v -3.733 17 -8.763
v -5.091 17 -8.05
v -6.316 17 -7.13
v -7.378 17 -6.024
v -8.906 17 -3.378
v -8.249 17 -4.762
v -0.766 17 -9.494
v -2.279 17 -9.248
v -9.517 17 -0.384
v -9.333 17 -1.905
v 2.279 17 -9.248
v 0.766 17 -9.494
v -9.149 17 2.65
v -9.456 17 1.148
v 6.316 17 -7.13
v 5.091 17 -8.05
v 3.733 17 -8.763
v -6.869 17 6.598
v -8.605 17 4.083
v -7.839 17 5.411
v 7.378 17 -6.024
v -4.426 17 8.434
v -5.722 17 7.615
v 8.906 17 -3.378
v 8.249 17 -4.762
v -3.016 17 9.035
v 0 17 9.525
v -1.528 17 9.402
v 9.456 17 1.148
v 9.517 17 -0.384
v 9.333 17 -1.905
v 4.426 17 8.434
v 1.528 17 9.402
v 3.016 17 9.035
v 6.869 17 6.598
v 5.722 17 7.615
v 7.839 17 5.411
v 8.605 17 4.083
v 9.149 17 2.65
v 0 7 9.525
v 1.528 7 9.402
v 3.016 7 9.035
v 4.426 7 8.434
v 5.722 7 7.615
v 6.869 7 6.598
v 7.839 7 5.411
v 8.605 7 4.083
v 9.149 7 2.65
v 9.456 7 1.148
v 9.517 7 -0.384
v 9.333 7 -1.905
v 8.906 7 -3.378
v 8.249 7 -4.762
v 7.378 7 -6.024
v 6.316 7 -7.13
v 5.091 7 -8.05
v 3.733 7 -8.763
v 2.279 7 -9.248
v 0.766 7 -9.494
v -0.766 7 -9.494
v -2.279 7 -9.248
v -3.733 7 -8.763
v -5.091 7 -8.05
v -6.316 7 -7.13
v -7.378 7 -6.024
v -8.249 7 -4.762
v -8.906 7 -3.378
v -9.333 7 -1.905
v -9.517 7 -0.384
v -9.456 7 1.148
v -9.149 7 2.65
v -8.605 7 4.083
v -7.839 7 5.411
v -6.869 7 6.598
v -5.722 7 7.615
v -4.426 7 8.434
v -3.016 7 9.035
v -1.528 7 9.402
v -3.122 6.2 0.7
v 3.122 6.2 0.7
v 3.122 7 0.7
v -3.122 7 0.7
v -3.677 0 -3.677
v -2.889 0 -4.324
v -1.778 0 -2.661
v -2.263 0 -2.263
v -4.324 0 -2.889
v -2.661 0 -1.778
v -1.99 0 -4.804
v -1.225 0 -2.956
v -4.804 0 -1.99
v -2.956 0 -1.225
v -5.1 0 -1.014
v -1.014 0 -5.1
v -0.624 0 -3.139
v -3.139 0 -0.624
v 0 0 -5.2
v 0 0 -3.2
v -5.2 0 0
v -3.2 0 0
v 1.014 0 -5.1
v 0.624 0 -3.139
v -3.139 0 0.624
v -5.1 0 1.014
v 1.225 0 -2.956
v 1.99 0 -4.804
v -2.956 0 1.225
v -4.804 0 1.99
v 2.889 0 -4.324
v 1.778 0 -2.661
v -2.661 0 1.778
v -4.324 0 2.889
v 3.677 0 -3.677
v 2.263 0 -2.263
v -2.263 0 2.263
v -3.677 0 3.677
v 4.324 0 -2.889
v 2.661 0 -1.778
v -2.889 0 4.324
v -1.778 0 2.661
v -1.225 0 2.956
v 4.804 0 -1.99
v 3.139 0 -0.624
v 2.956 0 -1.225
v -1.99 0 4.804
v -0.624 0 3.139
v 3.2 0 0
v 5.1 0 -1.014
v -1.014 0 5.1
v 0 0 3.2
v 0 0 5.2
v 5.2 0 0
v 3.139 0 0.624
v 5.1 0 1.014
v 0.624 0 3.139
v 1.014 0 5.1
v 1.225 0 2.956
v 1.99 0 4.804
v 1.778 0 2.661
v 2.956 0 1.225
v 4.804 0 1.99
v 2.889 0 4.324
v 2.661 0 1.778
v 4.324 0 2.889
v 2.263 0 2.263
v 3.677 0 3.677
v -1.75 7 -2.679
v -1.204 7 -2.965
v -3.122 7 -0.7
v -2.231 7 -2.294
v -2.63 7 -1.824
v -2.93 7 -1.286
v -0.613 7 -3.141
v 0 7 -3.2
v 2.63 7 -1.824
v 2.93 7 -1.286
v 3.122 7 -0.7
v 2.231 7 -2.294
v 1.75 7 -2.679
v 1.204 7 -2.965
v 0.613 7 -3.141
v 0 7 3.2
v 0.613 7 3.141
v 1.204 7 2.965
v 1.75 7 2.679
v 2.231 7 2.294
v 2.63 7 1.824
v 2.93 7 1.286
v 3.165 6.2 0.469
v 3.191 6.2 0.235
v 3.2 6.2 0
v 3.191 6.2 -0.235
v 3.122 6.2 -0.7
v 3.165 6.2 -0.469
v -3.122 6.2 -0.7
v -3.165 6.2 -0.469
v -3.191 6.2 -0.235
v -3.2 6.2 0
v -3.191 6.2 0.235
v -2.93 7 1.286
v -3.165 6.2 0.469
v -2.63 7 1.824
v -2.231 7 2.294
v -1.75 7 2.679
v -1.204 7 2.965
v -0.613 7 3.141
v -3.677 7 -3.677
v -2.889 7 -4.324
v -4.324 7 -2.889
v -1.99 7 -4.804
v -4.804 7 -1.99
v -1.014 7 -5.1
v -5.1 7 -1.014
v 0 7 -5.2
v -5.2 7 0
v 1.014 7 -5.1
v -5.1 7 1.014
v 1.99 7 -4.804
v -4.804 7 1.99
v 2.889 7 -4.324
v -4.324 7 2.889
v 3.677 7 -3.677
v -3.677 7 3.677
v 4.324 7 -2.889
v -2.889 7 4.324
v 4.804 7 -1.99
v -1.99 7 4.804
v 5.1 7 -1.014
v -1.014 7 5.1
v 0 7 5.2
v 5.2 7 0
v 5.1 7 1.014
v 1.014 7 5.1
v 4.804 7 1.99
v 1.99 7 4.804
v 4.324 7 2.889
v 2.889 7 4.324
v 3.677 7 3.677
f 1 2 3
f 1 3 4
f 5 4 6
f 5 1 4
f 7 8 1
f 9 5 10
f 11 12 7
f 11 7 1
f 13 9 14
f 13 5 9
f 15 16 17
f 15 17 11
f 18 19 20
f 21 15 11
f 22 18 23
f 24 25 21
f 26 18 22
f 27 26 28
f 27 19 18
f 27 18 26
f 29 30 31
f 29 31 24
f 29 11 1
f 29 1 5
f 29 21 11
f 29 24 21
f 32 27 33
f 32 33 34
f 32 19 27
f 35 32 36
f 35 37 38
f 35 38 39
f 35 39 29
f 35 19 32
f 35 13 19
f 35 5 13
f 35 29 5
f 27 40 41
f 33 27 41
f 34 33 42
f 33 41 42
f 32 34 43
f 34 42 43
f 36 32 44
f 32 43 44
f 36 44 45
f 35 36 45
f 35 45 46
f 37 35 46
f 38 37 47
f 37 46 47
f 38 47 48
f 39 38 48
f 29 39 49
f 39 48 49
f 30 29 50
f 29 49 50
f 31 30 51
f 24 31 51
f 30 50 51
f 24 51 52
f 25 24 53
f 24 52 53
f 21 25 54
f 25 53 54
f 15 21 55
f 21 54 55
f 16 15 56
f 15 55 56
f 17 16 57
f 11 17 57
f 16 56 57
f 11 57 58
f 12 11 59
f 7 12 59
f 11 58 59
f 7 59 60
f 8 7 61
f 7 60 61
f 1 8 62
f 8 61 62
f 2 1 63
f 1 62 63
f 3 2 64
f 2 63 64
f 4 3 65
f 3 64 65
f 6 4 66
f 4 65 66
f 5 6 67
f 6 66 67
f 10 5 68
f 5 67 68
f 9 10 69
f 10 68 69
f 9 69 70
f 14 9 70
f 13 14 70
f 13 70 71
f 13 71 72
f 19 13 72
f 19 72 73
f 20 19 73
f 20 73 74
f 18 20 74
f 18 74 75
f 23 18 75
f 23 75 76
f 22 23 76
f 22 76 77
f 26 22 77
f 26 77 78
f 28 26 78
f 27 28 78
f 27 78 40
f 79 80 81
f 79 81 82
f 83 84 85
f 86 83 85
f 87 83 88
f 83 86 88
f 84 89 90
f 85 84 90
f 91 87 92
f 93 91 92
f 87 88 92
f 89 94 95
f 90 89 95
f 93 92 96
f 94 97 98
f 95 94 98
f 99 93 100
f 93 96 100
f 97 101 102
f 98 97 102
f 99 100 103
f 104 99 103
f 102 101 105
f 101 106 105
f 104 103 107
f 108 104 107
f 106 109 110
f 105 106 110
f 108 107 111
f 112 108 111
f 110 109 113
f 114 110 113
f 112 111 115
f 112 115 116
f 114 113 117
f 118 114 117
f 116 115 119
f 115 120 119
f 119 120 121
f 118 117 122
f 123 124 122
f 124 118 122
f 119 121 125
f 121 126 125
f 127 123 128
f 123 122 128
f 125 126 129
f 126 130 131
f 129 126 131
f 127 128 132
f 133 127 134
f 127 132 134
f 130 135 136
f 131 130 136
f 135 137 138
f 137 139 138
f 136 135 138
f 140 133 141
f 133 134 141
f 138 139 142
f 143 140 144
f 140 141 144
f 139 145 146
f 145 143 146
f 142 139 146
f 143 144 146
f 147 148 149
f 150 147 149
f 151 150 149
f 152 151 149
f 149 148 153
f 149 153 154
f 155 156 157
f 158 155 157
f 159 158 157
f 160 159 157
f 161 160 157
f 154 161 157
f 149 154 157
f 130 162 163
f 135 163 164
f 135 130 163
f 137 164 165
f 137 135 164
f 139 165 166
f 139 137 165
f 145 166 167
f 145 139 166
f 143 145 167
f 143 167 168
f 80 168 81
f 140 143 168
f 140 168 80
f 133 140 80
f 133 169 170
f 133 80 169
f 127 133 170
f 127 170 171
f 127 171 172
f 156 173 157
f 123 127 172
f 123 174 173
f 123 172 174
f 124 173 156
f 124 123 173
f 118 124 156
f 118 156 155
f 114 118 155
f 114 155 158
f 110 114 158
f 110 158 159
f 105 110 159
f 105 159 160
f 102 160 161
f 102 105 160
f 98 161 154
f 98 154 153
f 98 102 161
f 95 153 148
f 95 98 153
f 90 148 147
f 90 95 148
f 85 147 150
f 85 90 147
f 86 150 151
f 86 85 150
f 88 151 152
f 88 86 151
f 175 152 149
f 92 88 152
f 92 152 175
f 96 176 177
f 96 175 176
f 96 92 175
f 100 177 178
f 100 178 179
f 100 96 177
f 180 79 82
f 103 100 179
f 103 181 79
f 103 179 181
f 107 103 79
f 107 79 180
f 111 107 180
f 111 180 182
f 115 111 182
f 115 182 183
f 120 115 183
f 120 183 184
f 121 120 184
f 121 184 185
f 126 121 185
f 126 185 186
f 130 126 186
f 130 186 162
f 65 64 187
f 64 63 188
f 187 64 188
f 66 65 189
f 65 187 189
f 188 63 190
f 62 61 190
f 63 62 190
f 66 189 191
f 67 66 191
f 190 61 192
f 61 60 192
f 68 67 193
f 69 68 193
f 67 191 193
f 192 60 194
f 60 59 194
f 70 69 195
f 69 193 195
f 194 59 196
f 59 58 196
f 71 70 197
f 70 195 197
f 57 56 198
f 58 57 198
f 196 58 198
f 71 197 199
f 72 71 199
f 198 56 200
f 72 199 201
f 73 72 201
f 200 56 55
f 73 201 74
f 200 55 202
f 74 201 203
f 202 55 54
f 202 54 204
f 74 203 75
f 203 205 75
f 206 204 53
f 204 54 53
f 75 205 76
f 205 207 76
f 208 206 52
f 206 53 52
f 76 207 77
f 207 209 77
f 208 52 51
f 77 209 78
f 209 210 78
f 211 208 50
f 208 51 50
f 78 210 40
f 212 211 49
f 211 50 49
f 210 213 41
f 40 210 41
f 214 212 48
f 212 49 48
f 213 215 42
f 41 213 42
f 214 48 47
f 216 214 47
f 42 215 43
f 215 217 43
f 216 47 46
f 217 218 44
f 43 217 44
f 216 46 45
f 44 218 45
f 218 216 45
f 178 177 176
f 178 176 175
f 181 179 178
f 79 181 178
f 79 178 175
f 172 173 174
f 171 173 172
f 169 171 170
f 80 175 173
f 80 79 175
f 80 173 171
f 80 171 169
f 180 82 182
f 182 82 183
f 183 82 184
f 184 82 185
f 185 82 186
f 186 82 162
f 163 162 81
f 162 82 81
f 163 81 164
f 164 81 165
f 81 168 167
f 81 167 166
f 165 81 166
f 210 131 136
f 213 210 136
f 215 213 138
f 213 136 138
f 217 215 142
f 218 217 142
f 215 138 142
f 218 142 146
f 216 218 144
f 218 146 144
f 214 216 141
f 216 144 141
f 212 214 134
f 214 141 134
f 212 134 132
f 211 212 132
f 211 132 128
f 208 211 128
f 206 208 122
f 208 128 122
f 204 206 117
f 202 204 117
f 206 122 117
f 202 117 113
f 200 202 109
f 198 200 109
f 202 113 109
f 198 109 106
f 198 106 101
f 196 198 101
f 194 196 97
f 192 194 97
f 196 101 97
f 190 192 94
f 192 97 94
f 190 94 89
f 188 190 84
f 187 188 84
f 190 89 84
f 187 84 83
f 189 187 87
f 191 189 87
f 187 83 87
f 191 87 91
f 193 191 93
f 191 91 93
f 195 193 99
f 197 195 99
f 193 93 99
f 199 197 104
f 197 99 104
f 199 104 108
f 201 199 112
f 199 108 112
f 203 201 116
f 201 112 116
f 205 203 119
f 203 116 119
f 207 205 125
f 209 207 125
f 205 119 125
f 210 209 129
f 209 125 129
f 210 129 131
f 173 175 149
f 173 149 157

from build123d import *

# Parameters (mm, degrees)
SKETCH1_R           = 5.2
SKETCH1_R_2         = 3.2
BOSS_EXTRUDE1_DEPTH = 7
SKETCH2_R           = 9.525
BOSS_EXTRUDE2_DEPTH = 10
BOSS_EXTRUDE3_START = 0.8
BOSS_EXTRUDE3_DEPTH = 0.8


with BuildPart() as part:
    # Sketch1 → Boss-Extrude1 (new body)
    with BuildSketch(Plane(origin=(0, 0, 0), x_dir=(1, 0, 0), z_dir=(0, 1, 0))):
        with Locations(Location((0, 0, 0), (0, 0, 270))):
            Circle(SKETCH1_R)
        with Locations(Location((0, 0, 0), (0, 0, 270))):
            Circle(SKETCH1_R_2, mode=Mode.SUBTRACT)
    extrude(amount=BOSS_EXTRUDE1_DEPTH)

    # Sketch2 → Boss-Extrude2 (add)
    with BuildSketch(Plane(origin=(0, 7, 0), x_dir=(1, 0, 0), z_dir=(0, 1, 0))):
        with Locations(Location((0, 0, 0), (0, 0, 270))):
            Circle(SKETCH2_R)
    extrude(amount=BOSS_EXTRUDE2_DEPTH)

    # Sketch3 → Boss-Extrude3 (add)
    with BuildSketch(Plane.XZ.offset(-7).offset(BOSS_EXTRUDE3_START)):
        with BuildLine():
            Line((3.122498999, 0.7), (-3.122498999, 0.7))
            ThreePointArc((-3.122498999, 0.7), (-3.180565736, 0.352138611), (-3.2, 0))
            ThreePointArc((-3.2, 0), (-3.180565736, -0.352138611), (-3.122498999, -0.7))
            Line((-3.122498999, -0.7), (3.122498999, -0.7))
            ThreePointArc((3.122498999, -0.7), (3.180565736, -0.352138611), (3.2, 0))
            ThreePointArc((3.2, 0), (3.180565736, 0.352138611), (3.122498999, 0.7))
        make_face()
    extrude(amount=-BOSS_EXTRUDE3_DEPTH)


solid = part.part
